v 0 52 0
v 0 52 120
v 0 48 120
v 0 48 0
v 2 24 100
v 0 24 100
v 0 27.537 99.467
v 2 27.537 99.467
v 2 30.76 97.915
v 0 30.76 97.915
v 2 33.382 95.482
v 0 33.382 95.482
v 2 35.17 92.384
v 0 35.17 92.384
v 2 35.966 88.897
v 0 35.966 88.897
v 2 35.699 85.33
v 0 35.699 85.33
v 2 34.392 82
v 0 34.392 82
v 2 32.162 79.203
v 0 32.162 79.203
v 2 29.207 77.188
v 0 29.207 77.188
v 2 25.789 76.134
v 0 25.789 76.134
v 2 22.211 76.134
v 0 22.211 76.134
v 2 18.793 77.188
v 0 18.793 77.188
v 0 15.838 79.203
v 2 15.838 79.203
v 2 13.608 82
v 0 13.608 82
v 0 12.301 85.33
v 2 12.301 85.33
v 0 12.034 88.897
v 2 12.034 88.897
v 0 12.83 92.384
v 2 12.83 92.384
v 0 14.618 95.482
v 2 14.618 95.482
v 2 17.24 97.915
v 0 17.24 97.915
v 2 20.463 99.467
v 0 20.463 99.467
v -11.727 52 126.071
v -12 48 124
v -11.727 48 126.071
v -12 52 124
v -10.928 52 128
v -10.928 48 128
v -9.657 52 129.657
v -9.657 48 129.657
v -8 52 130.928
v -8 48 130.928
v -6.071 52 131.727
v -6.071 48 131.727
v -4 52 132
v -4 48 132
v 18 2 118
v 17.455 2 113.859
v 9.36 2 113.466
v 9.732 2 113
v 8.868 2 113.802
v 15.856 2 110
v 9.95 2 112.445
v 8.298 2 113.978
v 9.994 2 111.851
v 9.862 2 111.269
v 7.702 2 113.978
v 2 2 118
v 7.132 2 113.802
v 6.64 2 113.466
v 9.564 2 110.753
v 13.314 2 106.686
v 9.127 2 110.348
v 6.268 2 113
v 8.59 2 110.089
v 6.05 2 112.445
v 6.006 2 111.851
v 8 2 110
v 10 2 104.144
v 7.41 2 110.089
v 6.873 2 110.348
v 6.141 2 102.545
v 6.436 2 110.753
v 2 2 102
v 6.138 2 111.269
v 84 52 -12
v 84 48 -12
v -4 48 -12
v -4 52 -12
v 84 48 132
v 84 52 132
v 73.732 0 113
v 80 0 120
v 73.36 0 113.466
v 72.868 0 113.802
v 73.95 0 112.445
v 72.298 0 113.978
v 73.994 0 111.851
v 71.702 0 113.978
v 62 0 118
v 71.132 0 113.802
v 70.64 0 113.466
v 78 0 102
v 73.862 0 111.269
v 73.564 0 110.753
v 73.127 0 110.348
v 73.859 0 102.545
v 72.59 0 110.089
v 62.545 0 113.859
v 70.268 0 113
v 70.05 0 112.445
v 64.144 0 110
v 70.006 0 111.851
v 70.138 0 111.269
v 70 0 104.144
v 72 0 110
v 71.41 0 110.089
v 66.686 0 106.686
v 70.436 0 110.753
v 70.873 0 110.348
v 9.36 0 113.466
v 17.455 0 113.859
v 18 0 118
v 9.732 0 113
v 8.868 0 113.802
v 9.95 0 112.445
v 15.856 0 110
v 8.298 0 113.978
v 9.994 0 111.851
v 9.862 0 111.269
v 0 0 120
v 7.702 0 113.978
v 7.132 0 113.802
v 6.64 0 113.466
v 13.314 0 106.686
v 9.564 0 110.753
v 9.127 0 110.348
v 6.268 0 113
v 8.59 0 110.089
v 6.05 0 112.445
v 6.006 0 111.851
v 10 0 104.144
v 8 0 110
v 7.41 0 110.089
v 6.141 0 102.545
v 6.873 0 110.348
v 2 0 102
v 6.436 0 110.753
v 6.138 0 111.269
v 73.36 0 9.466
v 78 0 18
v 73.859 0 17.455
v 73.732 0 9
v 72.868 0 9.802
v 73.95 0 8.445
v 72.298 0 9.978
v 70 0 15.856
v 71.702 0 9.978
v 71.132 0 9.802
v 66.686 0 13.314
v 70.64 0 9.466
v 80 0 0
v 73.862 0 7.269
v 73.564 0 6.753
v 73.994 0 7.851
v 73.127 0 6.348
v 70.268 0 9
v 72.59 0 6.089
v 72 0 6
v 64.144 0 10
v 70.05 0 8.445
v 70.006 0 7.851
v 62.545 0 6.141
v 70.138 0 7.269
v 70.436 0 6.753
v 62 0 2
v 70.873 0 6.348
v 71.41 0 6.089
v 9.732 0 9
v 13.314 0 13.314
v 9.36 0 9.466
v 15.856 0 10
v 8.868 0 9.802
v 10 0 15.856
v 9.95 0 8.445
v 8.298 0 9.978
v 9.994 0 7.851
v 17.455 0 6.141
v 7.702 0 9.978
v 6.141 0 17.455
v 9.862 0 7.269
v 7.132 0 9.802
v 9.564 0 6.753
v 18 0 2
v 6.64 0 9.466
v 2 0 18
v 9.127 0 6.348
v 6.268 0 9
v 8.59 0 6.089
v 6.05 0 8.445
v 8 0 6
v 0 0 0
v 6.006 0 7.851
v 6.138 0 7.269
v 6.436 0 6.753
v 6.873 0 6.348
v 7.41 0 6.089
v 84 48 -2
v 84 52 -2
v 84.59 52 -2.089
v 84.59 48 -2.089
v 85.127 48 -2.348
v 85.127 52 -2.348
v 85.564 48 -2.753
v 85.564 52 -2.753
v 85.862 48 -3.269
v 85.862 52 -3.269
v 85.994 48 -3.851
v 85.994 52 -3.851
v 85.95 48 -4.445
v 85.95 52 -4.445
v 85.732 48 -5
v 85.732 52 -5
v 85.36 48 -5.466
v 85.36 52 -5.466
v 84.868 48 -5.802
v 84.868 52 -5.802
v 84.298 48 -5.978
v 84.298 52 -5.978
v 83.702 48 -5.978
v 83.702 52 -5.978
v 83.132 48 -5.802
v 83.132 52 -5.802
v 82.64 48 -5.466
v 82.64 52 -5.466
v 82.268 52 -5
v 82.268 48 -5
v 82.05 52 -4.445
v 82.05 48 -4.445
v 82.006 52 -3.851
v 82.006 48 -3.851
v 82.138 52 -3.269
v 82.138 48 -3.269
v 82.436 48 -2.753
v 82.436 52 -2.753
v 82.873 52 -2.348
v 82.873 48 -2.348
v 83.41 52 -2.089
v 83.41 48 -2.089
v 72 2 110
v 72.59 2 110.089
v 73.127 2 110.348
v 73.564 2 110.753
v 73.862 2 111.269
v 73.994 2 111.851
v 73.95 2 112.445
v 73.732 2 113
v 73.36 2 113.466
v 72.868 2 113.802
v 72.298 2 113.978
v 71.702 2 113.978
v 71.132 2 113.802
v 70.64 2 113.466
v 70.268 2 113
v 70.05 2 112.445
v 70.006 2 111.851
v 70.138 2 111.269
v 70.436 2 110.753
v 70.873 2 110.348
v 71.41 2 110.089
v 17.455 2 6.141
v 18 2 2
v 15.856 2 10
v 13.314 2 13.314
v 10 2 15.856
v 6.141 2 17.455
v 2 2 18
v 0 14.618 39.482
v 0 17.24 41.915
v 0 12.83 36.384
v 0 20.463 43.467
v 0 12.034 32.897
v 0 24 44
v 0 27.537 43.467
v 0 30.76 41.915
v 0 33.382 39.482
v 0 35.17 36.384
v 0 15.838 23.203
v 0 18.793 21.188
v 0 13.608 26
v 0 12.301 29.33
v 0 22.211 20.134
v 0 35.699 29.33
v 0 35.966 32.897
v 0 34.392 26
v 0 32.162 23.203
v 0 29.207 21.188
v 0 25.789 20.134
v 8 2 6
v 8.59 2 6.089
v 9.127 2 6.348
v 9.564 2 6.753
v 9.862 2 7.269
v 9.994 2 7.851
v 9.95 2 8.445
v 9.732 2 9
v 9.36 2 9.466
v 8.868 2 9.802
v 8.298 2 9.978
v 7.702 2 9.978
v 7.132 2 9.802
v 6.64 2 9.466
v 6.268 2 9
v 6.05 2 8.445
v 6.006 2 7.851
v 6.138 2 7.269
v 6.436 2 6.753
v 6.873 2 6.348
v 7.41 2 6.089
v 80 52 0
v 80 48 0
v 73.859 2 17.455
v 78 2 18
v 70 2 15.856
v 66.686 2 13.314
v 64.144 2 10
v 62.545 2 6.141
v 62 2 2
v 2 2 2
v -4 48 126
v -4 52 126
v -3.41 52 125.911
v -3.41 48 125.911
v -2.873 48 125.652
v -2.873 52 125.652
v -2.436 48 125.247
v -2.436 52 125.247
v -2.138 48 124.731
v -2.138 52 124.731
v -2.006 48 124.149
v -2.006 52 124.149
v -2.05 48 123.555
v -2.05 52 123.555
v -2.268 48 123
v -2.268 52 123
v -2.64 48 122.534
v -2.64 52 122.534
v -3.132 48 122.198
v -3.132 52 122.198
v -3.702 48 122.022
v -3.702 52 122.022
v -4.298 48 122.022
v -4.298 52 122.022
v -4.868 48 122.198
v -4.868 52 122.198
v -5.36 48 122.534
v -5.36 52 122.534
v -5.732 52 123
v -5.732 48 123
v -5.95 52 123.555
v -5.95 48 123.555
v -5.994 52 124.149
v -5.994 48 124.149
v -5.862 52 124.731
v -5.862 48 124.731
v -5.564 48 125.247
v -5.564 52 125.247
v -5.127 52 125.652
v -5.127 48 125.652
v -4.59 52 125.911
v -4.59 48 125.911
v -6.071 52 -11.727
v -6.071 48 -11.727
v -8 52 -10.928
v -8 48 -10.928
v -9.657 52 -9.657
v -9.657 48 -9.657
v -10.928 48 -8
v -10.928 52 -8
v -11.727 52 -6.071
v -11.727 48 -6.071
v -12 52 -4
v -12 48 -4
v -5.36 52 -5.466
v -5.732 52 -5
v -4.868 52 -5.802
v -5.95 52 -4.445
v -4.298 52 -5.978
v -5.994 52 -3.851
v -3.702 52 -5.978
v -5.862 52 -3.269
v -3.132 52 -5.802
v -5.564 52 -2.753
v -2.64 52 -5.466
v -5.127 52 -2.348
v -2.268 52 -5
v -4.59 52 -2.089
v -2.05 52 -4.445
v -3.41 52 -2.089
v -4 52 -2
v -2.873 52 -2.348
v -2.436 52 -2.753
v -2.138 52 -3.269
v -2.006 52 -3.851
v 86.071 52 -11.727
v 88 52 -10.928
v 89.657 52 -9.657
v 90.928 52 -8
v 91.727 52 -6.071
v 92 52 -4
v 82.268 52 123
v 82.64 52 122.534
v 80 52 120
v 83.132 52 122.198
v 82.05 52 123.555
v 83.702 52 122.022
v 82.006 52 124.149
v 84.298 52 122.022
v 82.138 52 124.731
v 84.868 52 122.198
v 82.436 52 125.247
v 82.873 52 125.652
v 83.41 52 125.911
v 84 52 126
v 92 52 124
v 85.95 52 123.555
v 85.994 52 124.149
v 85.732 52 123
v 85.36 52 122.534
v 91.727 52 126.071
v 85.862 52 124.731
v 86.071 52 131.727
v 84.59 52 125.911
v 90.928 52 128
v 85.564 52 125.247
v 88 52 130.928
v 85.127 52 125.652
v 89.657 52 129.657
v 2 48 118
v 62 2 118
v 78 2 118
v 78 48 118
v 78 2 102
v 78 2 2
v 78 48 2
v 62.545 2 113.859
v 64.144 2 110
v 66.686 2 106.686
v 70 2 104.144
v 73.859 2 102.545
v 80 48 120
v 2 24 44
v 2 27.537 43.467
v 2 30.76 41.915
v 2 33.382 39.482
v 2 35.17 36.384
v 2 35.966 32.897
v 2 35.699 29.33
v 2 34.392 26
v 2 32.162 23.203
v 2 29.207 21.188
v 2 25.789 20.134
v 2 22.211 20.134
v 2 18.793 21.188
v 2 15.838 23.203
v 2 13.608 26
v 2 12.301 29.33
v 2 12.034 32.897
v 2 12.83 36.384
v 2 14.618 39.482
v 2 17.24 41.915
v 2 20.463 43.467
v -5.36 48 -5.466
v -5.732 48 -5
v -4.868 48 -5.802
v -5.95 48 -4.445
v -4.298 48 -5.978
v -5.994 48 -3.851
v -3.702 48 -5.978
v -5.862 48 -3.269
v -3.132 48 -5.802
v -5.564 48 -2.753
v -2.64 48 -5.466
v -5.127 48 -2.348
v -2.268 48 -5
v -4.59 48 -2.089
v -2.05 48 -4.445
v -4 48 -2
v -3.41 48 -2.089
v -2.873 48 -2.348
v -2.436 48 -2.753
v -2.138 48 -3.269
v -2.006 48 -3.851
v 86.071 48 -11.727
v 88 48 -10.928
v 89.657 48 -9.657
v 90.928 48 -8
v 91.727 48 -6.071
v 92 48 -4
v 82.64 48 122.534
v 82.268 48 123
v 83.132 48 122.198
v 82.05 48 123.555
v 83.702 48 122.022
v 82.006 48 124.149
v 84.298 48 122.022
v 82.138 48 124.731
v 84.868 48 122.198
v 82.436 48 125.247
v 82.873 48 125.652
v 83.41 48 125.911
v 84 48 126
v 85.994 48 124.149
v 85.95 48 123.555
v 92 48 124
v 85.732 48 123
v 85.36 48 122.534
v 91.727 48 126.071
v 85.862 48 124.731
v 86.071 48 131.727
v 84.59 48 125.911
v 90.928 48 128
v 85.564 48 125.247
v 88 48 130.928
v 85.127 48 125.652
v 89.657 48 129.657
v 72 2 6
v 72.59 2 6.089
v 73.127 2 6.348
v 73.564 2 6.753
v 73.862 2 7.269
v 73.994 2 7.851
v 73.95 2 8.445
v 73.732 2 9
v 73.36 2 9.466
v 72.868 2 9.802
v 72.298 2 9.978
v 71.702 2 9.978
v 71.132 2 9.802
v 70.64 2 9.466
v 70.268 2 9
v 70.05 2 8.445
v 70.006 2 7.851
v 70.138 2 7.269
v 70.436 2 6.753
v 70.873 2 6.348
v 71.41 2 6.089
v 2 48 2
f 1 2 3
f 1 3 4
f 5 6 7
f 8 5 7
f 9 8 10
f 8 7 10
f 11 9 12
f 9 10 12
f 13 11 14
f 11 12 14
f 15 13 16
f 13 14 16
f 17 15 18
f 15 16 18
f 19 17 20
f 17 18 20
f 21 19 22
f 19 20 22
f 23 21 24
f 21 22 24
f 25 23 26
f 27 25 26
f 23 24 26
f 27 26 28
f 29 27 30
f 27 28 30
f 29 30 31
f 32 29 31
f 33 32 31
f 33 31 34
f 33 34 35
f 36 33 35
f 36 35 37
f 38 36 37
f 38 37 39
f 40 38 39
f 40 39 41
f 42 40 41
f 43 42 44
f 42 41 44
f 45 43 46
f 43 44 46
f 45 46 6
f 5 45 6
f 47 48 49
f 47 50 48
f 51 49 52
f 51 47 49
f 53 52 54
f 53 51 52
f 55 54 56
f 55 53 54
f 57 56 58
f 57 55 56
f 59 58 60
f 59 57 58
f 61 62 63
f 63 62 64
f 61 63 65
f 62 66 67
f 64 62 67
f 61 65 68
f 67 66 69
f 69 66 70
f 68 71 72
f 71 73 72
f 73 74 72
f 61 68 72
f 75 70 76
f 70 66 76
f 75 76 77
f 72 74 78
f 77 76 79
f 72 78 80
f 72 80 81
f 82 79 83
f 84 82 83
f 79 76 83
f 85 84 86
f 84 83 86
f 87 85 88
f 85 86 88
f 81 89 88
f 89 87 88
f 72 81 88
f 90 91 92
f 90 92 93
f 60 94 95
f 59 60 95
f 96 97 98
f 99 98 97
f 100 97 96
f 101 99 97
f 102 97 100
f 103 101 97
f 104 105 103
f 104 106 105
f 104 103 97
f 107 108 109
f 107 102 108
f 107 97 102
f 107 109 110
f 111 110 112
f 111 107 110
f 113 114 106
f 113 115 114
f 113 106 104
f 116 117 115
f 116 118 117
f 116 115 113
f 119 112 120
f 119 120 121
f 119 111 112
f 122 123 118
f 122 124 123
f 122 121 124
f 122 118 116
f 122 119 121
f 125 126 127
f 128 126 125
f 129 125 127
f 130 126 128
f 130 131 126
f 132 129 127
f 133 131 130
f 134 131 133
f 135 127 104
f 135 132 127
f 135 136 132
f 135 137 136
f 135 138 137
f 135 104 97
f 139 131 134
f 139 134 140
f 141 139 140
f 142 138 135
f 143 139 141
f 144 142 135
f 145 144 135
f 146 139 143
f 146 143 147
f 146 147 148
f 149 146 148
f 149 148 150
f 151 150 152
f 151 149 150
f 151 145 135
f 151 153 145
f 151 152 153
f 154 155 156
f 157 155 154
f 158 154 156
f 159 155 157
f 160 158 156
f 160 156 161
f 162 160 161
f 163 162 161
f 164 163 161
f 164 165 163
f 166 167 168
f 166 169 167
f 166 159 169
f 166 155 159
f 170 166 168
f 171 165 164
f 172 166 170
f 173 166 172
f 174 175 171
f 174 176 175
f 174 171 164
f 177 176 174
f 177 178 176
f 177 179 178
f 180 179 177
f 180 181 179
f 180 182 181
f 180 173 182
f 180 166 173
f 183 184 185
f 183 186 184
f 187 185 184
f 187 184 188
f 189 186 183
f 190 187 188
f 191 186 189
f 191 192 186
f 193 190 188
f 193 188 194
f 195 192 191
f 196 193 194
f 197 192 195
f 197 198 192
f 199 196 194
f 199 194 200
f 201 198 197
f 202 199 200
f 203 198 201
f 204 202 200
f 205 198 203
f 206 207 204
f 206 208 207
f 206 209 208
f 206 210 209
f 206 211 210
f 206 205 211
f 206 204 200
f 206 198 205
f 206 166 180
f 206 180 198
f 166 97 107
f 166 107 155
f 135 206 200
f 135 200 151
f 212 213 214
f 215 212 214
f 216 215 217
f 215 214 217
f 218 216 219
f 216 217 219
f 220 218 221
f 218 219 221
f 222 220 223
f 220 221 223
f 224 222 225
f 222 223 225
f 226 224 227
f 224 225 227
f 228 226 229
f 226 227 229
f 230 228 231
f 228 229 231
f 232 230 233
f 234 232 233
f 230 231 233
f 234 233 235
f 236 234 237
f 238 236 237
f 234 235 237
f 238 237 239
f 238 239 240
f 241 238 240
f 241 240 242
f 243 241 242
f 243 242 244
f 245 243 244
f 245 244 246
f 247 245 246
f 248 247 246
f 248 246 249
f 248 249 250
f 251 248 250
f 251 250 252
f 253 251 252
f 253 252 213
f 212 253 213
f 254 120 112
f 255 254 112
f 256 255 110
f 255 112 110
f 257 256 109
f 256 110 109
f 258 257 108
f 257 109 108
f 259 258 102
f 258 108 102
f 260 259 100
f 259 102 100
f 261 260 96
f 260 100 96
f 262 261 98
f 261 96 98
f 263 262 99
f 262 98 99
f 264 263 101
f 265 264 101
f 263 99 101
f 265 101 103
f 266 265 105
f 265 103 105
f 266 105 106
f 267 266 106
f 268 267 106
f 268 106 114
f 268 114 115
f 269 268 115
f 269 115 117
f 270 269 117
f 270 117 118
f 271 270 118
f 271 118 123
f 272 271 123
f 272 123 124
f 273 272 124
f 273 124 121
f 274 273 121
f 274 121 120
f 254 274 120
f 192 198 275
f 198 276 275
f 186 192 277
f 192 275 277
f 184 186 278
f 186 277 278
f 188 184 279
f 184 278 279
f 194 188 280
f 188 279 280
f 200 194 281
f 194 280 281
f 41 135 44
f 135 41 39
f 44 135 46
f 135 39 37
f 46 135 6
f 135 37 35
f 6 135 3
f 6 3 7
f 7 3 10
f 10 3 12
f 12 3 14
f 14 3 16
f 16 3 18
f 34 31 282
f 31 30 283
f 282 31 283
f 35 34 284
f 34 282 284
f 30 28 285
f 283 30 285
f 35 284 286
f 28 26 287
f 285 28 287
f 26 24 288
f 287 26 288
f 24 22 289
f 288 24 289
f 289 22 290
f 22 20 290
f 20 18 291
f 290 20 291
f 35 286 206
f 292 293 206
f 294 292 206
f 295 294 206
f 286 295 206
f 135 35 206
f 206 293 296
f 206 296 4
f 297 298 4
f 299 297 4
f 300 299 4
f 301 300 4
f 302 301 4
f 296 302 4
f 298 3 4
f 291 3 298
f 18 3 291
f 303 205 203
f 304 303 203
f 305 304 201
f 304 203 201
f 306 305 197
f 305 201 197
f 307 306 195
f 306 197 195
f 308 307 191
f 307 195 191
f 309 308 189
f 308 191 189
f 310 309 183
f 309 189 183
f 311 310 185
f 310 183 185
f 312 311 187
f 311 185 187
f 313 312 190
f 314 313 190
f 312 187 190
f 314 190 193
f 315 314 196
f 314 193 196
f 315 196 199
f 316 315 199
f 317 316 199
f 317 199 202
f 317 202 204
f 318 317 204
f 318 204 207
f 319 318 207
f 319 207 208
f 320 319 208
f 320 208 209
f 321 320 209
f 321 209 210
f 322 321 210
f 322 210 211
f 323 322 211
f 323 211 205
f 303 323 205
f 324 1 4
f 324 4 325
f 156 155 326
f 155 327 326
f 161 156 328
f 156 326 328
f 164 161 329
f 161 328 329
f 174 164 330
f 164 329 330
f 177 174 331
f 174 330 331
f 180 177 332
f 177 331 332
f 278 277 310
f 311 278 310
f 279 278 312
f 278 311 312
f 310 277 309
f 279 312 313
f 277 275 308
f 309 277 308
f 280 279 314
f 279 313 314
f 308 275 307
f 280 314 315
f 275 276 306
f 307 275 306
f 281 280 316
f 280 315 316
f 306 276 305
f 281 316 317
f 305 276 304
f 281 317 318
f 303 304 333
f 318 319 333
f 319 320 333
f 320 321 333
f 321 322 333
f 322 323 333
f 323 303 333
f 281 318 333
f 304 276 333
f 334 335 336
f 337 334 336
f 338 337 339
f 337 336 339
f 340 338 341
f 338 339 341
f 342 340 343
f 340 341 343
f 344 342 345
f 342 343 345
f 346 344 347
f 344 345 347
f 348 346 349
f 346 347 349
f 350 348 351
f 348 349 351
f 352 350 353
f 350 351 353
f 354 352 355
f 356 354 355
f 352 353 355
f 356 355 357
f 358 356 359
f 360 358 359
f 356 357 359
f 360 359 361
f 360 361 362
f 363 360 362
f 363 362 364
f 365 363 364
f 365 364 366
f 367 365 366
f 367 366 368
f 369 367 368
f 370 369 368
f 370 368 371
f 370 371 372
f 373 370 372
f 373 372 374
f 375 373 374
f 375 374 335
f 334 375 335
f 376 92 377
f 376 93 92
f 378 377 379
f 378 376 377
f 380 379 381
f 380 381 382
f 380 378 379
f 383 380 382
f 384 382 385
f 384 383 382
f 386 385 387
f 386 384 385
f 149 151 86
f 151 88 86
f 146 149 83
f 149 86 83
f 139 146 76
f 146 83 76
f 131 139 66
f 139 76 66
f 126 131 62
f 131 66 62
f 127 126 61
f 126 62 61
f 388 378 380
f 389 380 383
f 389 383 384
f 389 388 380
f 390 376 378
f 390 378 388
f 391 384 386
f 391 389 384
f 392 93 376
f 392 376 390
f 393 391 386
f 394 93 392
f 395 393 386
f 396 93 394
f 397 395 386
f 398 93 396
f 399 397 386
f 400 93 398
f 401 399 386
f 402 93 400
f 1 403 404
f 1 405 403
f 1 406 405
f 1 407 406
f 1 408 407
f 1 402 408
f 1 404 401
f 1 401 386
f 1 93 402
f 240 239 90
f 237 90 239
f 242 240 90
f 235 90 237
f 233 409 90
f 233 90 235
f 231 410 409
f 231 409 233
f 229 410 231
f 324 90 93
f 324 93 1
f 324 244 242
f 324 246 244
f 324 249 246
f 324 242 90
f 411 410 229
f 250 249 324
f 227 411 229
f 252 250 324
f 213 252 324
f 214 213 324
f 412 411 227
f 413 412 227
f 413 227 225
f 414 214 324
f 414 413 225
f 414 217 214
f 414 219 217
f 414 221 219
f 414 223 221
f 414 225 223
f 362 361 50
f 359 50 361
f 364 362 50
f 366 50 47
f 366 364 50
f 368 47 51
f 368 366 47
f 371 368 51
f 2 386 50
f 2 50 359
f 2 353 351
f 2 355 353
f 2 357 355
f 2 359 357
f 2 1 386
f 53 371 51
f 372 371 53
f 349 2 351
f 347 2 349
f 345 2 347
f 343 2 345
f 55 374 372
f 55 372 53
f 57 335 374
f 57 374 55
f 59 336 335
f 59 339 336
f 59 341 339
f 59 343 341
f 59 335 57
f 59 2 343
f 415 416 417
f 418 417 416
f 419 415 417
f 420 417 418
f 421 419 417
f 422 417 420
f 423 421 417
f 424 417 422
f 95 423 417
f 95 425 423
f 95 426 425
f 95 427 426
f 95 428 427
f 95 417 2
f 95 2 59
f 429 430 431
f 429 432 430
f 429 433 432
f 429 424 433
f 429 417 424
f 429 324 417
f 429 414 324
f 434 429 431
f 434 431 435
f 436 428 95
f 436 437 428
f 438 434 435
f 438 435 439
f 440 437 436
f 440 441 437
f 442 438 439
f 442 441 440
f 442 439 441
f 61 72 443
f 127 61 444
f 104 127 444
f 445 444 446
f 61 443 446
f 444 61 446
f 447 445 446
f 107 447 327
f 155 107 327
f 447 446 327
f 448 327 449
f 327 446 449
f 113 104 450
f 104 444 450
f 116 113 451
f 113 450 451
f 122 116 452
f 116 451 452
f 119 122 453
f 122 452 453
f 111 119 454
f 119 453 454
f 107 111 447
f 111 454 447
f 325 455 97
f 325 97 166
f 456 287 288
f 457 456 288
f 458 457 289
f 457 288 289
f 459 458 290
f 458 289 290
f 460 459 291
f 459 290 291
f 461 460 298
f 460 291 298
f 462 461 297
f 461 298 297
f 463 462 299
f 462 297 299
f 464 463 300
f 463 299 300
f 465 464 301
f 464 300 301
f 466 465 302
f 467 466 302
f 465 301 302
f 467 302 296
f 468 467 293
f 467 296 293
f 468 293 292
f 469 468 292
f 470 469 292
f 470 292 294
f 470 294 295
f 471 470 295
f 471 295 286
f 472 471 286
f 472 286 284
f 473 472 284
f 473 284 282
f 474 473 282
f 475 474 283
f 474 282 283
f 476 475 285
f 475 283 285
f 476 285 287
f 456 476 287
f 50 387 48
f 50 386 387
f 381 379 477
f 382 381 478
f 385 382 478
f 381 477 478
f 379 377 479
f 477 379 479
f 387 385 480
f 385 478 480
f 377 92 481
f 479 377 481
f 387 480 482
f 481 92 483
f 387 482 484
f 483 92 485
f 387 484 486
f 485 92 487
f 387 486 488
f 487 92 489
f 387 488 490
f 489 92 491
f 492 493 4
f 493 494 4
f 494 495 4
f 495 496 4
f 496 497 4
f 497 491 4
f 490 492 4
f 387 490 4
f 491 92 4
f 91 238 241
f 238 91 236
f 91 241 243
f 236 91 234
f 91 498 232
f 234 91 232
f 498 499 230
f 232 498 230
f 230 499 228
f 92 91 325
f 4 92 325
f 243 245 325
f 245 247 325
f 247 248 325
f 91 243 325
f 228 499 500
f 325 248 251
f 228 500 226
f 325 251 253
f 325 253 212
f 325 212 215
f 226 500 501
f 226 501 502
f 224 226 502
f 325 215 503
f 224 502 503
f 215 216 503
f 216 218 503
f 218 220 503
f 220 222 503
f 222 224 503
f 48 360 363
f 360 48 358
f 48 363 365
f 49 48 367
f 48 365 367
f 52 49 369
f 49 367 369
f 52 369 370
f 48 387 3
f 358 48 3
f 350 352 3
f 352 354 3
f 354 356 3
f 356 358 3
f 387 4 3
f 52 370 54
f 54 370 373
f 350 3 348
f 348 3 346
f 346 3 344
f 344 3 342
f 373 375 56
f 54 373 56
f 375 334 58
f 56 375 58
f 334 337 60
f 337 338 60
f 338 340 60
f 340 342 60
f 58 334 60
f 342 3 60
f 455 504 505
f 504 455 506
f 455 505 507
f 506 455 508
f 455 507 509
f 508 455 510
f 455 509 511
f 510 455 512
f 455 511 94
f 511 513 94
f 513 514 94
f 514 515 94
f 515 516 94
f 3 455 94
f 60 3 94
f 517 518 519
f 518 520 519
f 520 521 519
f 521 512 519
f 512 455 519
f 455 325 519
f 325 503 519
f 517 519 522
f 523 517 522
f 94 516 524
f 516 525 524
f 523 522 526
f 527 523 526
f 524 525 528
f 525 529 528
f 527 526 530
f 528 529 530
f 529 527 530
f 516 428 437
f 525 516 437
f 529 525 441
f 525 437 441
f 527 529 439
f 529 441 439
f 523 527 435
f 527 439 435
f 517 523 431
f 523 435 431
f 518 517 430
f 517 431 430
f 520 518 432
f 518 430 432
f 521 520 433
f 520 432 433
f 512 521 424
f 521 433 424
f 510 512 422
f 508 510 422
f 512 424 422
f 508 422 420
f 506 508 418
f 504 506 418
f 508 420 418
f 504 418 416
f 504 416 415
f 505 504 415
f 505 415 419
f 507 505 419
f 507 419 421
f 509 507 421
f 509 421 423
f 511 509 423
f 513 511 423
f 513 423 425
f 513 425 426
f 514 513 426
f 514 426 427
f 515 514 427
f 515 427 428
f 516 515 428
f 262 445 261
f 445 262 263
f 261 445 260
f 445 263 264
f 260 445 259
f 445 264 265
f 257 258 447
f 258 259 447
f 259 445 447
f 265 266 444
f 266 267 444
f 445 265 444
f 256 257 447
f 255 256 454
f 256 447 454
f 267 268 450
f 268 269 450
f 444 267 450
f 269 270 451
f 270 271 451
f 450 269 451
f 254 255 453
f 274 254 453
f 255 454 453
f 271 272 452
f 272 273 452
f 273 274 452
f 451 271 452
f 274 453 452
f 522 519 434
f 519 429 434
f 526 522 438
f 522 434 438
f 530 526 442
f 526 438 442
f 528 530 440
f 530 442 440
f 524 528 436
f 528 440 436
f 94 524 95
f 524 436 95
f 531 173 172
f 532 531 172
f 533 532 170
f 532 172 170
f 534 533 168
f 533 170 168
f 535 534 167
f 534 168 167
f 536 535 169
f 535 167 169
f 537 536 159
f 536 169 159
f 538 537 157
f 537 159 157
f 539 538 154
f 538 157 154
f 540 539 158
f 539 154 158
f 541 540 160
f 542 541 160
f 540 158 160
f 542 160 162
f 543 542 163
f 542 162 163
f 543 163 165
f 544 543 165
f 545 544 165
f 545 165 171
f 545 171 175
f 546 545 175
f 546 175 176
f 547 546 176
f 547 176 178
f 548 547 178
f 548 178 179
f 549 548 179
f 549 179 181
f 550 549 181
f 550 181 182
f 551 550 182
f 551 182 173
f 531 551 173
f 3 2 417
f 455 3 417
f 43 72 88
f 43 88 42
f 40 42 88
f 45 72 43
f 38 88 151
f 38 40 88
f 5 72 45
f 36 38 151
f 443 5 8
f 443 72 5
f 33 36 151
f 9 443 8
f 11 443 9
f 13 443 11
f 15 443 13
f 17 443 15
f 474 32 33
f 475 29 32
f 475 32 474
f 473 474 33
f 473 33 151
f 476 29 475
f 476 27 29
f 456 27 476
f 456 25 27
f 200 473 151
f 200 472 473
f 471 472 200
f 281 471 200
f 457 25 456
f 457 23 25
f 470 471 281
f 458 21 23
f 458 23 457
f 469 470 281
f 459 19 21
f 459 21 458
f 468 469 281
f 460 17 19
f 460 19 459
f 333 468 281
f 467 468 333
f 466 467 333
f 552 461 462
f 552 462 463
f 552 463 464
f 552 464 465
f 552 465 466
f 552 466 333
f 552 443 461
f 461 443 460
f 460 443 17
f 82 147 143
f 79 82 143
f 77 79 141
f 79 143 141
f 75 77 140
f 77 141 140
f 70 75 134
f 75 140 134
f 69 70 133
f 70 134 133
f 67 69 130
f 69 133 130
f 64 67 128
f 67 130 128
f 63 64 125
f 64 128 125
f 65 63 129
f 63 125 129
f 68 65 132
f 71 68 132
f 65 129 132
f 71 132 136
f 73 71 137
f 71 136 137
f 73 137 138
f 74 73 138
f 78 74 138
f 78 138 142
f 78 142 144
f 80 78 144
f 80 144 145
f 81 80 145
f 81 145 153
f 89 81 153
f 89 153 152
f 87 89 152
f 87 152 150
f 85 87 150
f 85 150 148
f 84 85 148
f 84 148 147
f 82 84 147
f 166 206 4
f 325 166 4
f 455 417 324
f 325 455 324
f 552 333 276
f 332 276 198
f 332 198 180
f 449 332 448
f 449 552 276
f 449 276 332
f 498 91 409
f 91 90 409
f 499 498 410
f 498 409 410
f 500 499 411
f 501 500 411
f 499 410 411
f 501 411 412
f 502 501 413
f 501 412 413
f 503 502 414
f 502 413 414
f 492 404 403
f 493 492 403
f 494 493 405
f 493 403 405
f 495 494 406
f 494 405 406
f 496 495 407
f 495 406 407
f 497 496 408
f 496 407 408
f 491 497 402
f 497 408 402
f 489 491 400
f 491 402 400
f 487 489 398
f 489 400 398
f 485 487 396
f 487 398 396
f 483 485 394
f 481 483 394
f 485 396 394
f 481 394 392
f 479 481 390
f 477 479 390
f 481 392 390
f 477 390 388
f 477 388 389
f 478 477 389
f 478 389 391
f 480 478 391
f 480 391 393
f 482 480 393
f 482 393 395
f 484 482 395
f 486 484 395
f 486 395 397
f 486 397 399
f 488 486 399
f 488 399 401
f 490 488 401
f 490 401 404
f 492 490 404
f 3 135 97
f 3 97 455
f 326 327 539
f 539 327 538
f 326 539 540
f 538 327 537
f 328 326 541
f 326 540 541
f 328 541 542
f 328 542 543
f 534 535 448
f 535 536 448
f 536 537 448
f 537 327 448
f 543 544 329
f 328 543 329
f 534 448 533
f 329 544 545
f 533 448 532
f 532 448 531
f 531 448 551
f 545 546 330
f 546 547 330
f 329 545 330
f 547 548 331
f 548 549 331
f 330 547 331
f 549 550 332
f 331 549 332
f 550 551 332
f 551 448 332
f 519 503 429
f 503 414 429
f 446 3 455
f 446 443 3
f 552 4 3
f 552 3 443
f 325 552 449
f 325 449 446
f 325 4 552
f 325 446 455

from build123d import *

# Parameters (mm, degrees)
SIDE_VIEW_LARGE_RECT_W       = 120
SIDE_VIEW_LARGE_RECT_H       = 48
SALIENTE_EXTRUIR1_DEPTH      = 80
SALIENTE_EXTRUIR2_DEPTH      = 52
SALIENTE_EXTRUIR2_DEPTH_BACK = 52
CROQUIS4_W                   = 144
CROQUIS4_H                   = 4
CROQUIS6_W                   = 80
CROQUIS6_H                   = 120
CORTAR_EXTRUIR2_DEPTH        = 4
CROQUIS7_W                   = 76
CROQUIS7_H                   = 116
CORTAR_EXTRUIR3_DEPTH        = 168.904734895
CROQUIS8_W                   = 16
CROQUIS8_H                   = 16
SALIENTE_EXTRUIR3_DEPTH      = 2
MATRIZL1_COUNT               = 2
MATRIZL1_PITCH               = 60
MATRIZL1_COUNT_DIR2          = 2
MATRIZL1_PITCH_DIR2          = 100
REDONDEO1_R                  = 16
REDONDEO2_R                  = 16
REDONDEO3_R                  = 16
REDONDEO4_R                  = 16
REDONDEO5_R                  = 8
CROQUIS10_R                  = 2
CORTAR_EXTRUIR4_DEPTH        = 170.091691103
MATRIZL2_COUNT               = 2
MATRIZL2_PITCH               = 88
MATRIZL2_COUNT_DIR2          = 2
MATRIZL2_PITCH_DIR2          = 128
CROQUIS11_R                  = 2
CORTAR_EXTRUIR5_DEPTH        = 170.091691103
MATRIZL4_COUNT               = 2
MATRIZL4_PITCH               = 64
MATRIZL4_COUNT_DIR2          = 2
MATRIZL4_PITCH_DIR2          = 104
CROQUIS12_R                  = 12
CORTAR_EXTRUIR6_DEPTH        = 2


with BuildPart() as part:
    # Side-view-large-rect → Saliente-Extruir1 (new body)
    with BuildSketch(Plane(origin=(0, 0, 0), x_dir=(0, 0, -1), z_dir=(1, 0, 0))):
        with Locations((-60, 24)):
            Rectangle(SIDE_VIEW_LARGE_RECT_W, SIDE_VIEW_LARGE_RECT_H)
    extrude(amount=SALIENTE_EXTRUIR1_DEPTH)

    # Croquis4 → Saliente-Extruir2 (add, two sides: drawn at the far end of the back side and taken through both)
    with BuildSketch(Plane.ZY.offset(-40).offset(-SALIENTE_EXTRUIR2_DEPTH_BACK)):
        with Locations((60, 50)):
            Rectangle(CROQUIS4_W, CROQUIS4_H)
    extrude(amount=SALIENTE_EXTRUIR2_DEPTH + SALIENTE_EXTRUIR2_DEPTH_BACK)

    # Croquis6 → Cortar-Extruir2 (cut)
    with BuildSketch(Plane(origin=(0, 52, 0), x_dir=(1, 0, 0), z_dir=(0, 1, 0))):
        with Locations((40, -60)):
            Rectangle(CROQUIS6_W, CROQUIS6_H)
    extrude(amount=-CORTAR_EXTRUIR2_DEPTH, mode=Mode.SUBTRACT)


with BuildPart() as cortar_extruir2_piece_1:
    # of the separate pieces the step leaves, piece 1, a body of its own (cortar_extruir2_pieces)
    add(part.part.solids().sort_by_distance((0, 0, 120))[0])

    # Croquis7 → Cortar-Extruir3 (cut, through all)
    with BuildSketch(Plane(origin=(0, 48, 0), x_dir=(1, 0, 0), z_dir=(0, 1, 0))):
        with Locations((40, -60)):
            Rectangle(CROQUIS7_W, CROQUIS7_H)
    extrude(amount=-CORTAR_EXTRUIR3_DEPTH, mode=Mode.SUBTRACT)

    # Croquis8 → Saliente-Extruir3 (add)
    with BuildSketch(Plane(origin=(0, 0, 0), x_dir=(-1, 0, 0), z_dir=(0, -1, 0))):
        with Locations((-70, -10)):
            Rectangle(CROQUIS8_W, CROQUIS8_H)
    saliente_extruir3 = extrude(amount=-SALIENTE_EXTRUIR3_DEPTH)

    # MatrizL1: Saliente-Extruir3 2 × 2
    with Locations(*[(-i * MATRIZL1_PITCH, 0, j * MATRIZL1_PITCH_DIR2) for i in range(MATRIZL1_COUNT) for j in range(MATRIZL1_COUNT_DIR2) if (i, j) != (0, 0)]):
        add(saliente_extruir3)

    # Redondeo1
    redondeo1_edges = [cortar_extruir2_piece_1.edges().sort_by_distance(p)[0] for p in [
        (62, 1, 18),
    ]]
    fillet(redondeo1_edges, radius=REDONDEO1_R - 0.0001)  # a hair under: the kernel refuses the full size

    # Redondeo2
    redondeo2_edges = [cortar_extruir2_piece_1.edges().sort_by_distance(p)[0] for p in [
        (18, 1, 18),
    ]]
    fillet(redondeo2_edges, radius=REDONDEO2_R - 0.0001)  # a hair under: the kernel refuses the full size

    # Redondeo3
    redondeo3_edges = [cortar_extruir2_piece_1.edges().sort_by_distance(p)[0] for p in [
        (18, 1, 102),
    ]]
    fillet(redondeo3_edges, radius=REDONDEO3_R - 0.0001)  # a hair under: the kernel refuses the full size

    # Redondeo4
    redondeo4_edges = [cortar_extruir2_piece_1.edges().sort_by_distance(p)[0] for p in [
        (62, 1, 102),
    ]]
    fillet(redondeo4_edges, radius=REDONDEO4_R - 0.0001)  # a hair under: the kernel refuses the full size

    # Croquis11 → Cortar-Extruir5 (cut, through all)
    with BuildSketch(Plane(origin=(0, 0, 0), x_dir=(-1, 0, 0), z_dir=(0, -1, 0))):
        with Locations(Location((-72, -8, 0), (0, 0, 90))):
            Circle(CROQUIS11_R)
    cortar_extruir5 = extrude(amount=-CORTAR_EXTRUIR5_DEPTH, mode=Mode.SUBTRACT)

    # MatrizL4: Cortar-Extruir5 2 × 2
    with Locations(*[(-i * MATRIZL4_PITCH, 0, j * MATRIZL4_PITCH_DIR2) for i in range(MATRIZL4_COUNT) for j in range(MATRIZL4_COUNT_DIR2) if (i, j) != (0, 0)]):
        add(cortar_extruir5, mode=Mode.SUBTRACT)

    # Croquis12 → Cortar-Extruir6 (cut)
    with BuildSketch(Plane.ZY):
        with Locations((32, 24)):
            Circle(CROQUIS12_R)
        with Locations((88, 24)):
            Circle(CROQUIS12_R)
    extrude(amount=-CORTAR_EXTRUIR6_DEPTH, mode=Mode.SUBTRACT)


with BuildPart() as cortar_extruir2_piece_2:
    # of the separate pieces the step leaves, piece 2, a body of its own (cortar_extruir2_pieces)
    add(part.part.solids().sort_by_distance((-12, 48, -12))[0])

    # Redondeo5
    redondeo5_edges = [cortar_extruir2_piece_2.edges().sort_by_distance(p)[0] for p in [
        (92, 50, -12),
        (92, 50, 132),
        (-12, 50, -12),
        (-12, 50, 132),
    ]]
    fillet(redondeo5_edges, radius=REDONDEO5_R)

    # Croquis10 → Cortar-Extruir4 (cut, through all)
    with BuildSketch(Plane(origin=(0, 52, 0), x_dir=(1, 0, 0), z_dir=(0, 1, 0))):
        with Locations(Location((-4, 4, 0), (0, 0, 270))):
            Circle(CROQUIS10_R)
    cortar_extruir4 = extrude(amount=-CORTAR_EXTRUIR4_DEPTH, mode=Mode.SUBTRACT)

    # MatrizL2: Cortar-Extruir4 2 × 2
    with Locations(*[(i * MATRIZL2_PITCH, 0, j * MATRIZL2_PITCH_DIR2) for i in range(MATRIZL2_COUNT) for j in range(MATRIZL2_COUNT_DIR2) if (i, j) != (0, 0)]):
        add(cortar_extruir4, mode=Mode.SUBTRACT)


solid = Compound([cortar_extruir2_piece_1.part, cortar_extruir2_piece_2.part])
